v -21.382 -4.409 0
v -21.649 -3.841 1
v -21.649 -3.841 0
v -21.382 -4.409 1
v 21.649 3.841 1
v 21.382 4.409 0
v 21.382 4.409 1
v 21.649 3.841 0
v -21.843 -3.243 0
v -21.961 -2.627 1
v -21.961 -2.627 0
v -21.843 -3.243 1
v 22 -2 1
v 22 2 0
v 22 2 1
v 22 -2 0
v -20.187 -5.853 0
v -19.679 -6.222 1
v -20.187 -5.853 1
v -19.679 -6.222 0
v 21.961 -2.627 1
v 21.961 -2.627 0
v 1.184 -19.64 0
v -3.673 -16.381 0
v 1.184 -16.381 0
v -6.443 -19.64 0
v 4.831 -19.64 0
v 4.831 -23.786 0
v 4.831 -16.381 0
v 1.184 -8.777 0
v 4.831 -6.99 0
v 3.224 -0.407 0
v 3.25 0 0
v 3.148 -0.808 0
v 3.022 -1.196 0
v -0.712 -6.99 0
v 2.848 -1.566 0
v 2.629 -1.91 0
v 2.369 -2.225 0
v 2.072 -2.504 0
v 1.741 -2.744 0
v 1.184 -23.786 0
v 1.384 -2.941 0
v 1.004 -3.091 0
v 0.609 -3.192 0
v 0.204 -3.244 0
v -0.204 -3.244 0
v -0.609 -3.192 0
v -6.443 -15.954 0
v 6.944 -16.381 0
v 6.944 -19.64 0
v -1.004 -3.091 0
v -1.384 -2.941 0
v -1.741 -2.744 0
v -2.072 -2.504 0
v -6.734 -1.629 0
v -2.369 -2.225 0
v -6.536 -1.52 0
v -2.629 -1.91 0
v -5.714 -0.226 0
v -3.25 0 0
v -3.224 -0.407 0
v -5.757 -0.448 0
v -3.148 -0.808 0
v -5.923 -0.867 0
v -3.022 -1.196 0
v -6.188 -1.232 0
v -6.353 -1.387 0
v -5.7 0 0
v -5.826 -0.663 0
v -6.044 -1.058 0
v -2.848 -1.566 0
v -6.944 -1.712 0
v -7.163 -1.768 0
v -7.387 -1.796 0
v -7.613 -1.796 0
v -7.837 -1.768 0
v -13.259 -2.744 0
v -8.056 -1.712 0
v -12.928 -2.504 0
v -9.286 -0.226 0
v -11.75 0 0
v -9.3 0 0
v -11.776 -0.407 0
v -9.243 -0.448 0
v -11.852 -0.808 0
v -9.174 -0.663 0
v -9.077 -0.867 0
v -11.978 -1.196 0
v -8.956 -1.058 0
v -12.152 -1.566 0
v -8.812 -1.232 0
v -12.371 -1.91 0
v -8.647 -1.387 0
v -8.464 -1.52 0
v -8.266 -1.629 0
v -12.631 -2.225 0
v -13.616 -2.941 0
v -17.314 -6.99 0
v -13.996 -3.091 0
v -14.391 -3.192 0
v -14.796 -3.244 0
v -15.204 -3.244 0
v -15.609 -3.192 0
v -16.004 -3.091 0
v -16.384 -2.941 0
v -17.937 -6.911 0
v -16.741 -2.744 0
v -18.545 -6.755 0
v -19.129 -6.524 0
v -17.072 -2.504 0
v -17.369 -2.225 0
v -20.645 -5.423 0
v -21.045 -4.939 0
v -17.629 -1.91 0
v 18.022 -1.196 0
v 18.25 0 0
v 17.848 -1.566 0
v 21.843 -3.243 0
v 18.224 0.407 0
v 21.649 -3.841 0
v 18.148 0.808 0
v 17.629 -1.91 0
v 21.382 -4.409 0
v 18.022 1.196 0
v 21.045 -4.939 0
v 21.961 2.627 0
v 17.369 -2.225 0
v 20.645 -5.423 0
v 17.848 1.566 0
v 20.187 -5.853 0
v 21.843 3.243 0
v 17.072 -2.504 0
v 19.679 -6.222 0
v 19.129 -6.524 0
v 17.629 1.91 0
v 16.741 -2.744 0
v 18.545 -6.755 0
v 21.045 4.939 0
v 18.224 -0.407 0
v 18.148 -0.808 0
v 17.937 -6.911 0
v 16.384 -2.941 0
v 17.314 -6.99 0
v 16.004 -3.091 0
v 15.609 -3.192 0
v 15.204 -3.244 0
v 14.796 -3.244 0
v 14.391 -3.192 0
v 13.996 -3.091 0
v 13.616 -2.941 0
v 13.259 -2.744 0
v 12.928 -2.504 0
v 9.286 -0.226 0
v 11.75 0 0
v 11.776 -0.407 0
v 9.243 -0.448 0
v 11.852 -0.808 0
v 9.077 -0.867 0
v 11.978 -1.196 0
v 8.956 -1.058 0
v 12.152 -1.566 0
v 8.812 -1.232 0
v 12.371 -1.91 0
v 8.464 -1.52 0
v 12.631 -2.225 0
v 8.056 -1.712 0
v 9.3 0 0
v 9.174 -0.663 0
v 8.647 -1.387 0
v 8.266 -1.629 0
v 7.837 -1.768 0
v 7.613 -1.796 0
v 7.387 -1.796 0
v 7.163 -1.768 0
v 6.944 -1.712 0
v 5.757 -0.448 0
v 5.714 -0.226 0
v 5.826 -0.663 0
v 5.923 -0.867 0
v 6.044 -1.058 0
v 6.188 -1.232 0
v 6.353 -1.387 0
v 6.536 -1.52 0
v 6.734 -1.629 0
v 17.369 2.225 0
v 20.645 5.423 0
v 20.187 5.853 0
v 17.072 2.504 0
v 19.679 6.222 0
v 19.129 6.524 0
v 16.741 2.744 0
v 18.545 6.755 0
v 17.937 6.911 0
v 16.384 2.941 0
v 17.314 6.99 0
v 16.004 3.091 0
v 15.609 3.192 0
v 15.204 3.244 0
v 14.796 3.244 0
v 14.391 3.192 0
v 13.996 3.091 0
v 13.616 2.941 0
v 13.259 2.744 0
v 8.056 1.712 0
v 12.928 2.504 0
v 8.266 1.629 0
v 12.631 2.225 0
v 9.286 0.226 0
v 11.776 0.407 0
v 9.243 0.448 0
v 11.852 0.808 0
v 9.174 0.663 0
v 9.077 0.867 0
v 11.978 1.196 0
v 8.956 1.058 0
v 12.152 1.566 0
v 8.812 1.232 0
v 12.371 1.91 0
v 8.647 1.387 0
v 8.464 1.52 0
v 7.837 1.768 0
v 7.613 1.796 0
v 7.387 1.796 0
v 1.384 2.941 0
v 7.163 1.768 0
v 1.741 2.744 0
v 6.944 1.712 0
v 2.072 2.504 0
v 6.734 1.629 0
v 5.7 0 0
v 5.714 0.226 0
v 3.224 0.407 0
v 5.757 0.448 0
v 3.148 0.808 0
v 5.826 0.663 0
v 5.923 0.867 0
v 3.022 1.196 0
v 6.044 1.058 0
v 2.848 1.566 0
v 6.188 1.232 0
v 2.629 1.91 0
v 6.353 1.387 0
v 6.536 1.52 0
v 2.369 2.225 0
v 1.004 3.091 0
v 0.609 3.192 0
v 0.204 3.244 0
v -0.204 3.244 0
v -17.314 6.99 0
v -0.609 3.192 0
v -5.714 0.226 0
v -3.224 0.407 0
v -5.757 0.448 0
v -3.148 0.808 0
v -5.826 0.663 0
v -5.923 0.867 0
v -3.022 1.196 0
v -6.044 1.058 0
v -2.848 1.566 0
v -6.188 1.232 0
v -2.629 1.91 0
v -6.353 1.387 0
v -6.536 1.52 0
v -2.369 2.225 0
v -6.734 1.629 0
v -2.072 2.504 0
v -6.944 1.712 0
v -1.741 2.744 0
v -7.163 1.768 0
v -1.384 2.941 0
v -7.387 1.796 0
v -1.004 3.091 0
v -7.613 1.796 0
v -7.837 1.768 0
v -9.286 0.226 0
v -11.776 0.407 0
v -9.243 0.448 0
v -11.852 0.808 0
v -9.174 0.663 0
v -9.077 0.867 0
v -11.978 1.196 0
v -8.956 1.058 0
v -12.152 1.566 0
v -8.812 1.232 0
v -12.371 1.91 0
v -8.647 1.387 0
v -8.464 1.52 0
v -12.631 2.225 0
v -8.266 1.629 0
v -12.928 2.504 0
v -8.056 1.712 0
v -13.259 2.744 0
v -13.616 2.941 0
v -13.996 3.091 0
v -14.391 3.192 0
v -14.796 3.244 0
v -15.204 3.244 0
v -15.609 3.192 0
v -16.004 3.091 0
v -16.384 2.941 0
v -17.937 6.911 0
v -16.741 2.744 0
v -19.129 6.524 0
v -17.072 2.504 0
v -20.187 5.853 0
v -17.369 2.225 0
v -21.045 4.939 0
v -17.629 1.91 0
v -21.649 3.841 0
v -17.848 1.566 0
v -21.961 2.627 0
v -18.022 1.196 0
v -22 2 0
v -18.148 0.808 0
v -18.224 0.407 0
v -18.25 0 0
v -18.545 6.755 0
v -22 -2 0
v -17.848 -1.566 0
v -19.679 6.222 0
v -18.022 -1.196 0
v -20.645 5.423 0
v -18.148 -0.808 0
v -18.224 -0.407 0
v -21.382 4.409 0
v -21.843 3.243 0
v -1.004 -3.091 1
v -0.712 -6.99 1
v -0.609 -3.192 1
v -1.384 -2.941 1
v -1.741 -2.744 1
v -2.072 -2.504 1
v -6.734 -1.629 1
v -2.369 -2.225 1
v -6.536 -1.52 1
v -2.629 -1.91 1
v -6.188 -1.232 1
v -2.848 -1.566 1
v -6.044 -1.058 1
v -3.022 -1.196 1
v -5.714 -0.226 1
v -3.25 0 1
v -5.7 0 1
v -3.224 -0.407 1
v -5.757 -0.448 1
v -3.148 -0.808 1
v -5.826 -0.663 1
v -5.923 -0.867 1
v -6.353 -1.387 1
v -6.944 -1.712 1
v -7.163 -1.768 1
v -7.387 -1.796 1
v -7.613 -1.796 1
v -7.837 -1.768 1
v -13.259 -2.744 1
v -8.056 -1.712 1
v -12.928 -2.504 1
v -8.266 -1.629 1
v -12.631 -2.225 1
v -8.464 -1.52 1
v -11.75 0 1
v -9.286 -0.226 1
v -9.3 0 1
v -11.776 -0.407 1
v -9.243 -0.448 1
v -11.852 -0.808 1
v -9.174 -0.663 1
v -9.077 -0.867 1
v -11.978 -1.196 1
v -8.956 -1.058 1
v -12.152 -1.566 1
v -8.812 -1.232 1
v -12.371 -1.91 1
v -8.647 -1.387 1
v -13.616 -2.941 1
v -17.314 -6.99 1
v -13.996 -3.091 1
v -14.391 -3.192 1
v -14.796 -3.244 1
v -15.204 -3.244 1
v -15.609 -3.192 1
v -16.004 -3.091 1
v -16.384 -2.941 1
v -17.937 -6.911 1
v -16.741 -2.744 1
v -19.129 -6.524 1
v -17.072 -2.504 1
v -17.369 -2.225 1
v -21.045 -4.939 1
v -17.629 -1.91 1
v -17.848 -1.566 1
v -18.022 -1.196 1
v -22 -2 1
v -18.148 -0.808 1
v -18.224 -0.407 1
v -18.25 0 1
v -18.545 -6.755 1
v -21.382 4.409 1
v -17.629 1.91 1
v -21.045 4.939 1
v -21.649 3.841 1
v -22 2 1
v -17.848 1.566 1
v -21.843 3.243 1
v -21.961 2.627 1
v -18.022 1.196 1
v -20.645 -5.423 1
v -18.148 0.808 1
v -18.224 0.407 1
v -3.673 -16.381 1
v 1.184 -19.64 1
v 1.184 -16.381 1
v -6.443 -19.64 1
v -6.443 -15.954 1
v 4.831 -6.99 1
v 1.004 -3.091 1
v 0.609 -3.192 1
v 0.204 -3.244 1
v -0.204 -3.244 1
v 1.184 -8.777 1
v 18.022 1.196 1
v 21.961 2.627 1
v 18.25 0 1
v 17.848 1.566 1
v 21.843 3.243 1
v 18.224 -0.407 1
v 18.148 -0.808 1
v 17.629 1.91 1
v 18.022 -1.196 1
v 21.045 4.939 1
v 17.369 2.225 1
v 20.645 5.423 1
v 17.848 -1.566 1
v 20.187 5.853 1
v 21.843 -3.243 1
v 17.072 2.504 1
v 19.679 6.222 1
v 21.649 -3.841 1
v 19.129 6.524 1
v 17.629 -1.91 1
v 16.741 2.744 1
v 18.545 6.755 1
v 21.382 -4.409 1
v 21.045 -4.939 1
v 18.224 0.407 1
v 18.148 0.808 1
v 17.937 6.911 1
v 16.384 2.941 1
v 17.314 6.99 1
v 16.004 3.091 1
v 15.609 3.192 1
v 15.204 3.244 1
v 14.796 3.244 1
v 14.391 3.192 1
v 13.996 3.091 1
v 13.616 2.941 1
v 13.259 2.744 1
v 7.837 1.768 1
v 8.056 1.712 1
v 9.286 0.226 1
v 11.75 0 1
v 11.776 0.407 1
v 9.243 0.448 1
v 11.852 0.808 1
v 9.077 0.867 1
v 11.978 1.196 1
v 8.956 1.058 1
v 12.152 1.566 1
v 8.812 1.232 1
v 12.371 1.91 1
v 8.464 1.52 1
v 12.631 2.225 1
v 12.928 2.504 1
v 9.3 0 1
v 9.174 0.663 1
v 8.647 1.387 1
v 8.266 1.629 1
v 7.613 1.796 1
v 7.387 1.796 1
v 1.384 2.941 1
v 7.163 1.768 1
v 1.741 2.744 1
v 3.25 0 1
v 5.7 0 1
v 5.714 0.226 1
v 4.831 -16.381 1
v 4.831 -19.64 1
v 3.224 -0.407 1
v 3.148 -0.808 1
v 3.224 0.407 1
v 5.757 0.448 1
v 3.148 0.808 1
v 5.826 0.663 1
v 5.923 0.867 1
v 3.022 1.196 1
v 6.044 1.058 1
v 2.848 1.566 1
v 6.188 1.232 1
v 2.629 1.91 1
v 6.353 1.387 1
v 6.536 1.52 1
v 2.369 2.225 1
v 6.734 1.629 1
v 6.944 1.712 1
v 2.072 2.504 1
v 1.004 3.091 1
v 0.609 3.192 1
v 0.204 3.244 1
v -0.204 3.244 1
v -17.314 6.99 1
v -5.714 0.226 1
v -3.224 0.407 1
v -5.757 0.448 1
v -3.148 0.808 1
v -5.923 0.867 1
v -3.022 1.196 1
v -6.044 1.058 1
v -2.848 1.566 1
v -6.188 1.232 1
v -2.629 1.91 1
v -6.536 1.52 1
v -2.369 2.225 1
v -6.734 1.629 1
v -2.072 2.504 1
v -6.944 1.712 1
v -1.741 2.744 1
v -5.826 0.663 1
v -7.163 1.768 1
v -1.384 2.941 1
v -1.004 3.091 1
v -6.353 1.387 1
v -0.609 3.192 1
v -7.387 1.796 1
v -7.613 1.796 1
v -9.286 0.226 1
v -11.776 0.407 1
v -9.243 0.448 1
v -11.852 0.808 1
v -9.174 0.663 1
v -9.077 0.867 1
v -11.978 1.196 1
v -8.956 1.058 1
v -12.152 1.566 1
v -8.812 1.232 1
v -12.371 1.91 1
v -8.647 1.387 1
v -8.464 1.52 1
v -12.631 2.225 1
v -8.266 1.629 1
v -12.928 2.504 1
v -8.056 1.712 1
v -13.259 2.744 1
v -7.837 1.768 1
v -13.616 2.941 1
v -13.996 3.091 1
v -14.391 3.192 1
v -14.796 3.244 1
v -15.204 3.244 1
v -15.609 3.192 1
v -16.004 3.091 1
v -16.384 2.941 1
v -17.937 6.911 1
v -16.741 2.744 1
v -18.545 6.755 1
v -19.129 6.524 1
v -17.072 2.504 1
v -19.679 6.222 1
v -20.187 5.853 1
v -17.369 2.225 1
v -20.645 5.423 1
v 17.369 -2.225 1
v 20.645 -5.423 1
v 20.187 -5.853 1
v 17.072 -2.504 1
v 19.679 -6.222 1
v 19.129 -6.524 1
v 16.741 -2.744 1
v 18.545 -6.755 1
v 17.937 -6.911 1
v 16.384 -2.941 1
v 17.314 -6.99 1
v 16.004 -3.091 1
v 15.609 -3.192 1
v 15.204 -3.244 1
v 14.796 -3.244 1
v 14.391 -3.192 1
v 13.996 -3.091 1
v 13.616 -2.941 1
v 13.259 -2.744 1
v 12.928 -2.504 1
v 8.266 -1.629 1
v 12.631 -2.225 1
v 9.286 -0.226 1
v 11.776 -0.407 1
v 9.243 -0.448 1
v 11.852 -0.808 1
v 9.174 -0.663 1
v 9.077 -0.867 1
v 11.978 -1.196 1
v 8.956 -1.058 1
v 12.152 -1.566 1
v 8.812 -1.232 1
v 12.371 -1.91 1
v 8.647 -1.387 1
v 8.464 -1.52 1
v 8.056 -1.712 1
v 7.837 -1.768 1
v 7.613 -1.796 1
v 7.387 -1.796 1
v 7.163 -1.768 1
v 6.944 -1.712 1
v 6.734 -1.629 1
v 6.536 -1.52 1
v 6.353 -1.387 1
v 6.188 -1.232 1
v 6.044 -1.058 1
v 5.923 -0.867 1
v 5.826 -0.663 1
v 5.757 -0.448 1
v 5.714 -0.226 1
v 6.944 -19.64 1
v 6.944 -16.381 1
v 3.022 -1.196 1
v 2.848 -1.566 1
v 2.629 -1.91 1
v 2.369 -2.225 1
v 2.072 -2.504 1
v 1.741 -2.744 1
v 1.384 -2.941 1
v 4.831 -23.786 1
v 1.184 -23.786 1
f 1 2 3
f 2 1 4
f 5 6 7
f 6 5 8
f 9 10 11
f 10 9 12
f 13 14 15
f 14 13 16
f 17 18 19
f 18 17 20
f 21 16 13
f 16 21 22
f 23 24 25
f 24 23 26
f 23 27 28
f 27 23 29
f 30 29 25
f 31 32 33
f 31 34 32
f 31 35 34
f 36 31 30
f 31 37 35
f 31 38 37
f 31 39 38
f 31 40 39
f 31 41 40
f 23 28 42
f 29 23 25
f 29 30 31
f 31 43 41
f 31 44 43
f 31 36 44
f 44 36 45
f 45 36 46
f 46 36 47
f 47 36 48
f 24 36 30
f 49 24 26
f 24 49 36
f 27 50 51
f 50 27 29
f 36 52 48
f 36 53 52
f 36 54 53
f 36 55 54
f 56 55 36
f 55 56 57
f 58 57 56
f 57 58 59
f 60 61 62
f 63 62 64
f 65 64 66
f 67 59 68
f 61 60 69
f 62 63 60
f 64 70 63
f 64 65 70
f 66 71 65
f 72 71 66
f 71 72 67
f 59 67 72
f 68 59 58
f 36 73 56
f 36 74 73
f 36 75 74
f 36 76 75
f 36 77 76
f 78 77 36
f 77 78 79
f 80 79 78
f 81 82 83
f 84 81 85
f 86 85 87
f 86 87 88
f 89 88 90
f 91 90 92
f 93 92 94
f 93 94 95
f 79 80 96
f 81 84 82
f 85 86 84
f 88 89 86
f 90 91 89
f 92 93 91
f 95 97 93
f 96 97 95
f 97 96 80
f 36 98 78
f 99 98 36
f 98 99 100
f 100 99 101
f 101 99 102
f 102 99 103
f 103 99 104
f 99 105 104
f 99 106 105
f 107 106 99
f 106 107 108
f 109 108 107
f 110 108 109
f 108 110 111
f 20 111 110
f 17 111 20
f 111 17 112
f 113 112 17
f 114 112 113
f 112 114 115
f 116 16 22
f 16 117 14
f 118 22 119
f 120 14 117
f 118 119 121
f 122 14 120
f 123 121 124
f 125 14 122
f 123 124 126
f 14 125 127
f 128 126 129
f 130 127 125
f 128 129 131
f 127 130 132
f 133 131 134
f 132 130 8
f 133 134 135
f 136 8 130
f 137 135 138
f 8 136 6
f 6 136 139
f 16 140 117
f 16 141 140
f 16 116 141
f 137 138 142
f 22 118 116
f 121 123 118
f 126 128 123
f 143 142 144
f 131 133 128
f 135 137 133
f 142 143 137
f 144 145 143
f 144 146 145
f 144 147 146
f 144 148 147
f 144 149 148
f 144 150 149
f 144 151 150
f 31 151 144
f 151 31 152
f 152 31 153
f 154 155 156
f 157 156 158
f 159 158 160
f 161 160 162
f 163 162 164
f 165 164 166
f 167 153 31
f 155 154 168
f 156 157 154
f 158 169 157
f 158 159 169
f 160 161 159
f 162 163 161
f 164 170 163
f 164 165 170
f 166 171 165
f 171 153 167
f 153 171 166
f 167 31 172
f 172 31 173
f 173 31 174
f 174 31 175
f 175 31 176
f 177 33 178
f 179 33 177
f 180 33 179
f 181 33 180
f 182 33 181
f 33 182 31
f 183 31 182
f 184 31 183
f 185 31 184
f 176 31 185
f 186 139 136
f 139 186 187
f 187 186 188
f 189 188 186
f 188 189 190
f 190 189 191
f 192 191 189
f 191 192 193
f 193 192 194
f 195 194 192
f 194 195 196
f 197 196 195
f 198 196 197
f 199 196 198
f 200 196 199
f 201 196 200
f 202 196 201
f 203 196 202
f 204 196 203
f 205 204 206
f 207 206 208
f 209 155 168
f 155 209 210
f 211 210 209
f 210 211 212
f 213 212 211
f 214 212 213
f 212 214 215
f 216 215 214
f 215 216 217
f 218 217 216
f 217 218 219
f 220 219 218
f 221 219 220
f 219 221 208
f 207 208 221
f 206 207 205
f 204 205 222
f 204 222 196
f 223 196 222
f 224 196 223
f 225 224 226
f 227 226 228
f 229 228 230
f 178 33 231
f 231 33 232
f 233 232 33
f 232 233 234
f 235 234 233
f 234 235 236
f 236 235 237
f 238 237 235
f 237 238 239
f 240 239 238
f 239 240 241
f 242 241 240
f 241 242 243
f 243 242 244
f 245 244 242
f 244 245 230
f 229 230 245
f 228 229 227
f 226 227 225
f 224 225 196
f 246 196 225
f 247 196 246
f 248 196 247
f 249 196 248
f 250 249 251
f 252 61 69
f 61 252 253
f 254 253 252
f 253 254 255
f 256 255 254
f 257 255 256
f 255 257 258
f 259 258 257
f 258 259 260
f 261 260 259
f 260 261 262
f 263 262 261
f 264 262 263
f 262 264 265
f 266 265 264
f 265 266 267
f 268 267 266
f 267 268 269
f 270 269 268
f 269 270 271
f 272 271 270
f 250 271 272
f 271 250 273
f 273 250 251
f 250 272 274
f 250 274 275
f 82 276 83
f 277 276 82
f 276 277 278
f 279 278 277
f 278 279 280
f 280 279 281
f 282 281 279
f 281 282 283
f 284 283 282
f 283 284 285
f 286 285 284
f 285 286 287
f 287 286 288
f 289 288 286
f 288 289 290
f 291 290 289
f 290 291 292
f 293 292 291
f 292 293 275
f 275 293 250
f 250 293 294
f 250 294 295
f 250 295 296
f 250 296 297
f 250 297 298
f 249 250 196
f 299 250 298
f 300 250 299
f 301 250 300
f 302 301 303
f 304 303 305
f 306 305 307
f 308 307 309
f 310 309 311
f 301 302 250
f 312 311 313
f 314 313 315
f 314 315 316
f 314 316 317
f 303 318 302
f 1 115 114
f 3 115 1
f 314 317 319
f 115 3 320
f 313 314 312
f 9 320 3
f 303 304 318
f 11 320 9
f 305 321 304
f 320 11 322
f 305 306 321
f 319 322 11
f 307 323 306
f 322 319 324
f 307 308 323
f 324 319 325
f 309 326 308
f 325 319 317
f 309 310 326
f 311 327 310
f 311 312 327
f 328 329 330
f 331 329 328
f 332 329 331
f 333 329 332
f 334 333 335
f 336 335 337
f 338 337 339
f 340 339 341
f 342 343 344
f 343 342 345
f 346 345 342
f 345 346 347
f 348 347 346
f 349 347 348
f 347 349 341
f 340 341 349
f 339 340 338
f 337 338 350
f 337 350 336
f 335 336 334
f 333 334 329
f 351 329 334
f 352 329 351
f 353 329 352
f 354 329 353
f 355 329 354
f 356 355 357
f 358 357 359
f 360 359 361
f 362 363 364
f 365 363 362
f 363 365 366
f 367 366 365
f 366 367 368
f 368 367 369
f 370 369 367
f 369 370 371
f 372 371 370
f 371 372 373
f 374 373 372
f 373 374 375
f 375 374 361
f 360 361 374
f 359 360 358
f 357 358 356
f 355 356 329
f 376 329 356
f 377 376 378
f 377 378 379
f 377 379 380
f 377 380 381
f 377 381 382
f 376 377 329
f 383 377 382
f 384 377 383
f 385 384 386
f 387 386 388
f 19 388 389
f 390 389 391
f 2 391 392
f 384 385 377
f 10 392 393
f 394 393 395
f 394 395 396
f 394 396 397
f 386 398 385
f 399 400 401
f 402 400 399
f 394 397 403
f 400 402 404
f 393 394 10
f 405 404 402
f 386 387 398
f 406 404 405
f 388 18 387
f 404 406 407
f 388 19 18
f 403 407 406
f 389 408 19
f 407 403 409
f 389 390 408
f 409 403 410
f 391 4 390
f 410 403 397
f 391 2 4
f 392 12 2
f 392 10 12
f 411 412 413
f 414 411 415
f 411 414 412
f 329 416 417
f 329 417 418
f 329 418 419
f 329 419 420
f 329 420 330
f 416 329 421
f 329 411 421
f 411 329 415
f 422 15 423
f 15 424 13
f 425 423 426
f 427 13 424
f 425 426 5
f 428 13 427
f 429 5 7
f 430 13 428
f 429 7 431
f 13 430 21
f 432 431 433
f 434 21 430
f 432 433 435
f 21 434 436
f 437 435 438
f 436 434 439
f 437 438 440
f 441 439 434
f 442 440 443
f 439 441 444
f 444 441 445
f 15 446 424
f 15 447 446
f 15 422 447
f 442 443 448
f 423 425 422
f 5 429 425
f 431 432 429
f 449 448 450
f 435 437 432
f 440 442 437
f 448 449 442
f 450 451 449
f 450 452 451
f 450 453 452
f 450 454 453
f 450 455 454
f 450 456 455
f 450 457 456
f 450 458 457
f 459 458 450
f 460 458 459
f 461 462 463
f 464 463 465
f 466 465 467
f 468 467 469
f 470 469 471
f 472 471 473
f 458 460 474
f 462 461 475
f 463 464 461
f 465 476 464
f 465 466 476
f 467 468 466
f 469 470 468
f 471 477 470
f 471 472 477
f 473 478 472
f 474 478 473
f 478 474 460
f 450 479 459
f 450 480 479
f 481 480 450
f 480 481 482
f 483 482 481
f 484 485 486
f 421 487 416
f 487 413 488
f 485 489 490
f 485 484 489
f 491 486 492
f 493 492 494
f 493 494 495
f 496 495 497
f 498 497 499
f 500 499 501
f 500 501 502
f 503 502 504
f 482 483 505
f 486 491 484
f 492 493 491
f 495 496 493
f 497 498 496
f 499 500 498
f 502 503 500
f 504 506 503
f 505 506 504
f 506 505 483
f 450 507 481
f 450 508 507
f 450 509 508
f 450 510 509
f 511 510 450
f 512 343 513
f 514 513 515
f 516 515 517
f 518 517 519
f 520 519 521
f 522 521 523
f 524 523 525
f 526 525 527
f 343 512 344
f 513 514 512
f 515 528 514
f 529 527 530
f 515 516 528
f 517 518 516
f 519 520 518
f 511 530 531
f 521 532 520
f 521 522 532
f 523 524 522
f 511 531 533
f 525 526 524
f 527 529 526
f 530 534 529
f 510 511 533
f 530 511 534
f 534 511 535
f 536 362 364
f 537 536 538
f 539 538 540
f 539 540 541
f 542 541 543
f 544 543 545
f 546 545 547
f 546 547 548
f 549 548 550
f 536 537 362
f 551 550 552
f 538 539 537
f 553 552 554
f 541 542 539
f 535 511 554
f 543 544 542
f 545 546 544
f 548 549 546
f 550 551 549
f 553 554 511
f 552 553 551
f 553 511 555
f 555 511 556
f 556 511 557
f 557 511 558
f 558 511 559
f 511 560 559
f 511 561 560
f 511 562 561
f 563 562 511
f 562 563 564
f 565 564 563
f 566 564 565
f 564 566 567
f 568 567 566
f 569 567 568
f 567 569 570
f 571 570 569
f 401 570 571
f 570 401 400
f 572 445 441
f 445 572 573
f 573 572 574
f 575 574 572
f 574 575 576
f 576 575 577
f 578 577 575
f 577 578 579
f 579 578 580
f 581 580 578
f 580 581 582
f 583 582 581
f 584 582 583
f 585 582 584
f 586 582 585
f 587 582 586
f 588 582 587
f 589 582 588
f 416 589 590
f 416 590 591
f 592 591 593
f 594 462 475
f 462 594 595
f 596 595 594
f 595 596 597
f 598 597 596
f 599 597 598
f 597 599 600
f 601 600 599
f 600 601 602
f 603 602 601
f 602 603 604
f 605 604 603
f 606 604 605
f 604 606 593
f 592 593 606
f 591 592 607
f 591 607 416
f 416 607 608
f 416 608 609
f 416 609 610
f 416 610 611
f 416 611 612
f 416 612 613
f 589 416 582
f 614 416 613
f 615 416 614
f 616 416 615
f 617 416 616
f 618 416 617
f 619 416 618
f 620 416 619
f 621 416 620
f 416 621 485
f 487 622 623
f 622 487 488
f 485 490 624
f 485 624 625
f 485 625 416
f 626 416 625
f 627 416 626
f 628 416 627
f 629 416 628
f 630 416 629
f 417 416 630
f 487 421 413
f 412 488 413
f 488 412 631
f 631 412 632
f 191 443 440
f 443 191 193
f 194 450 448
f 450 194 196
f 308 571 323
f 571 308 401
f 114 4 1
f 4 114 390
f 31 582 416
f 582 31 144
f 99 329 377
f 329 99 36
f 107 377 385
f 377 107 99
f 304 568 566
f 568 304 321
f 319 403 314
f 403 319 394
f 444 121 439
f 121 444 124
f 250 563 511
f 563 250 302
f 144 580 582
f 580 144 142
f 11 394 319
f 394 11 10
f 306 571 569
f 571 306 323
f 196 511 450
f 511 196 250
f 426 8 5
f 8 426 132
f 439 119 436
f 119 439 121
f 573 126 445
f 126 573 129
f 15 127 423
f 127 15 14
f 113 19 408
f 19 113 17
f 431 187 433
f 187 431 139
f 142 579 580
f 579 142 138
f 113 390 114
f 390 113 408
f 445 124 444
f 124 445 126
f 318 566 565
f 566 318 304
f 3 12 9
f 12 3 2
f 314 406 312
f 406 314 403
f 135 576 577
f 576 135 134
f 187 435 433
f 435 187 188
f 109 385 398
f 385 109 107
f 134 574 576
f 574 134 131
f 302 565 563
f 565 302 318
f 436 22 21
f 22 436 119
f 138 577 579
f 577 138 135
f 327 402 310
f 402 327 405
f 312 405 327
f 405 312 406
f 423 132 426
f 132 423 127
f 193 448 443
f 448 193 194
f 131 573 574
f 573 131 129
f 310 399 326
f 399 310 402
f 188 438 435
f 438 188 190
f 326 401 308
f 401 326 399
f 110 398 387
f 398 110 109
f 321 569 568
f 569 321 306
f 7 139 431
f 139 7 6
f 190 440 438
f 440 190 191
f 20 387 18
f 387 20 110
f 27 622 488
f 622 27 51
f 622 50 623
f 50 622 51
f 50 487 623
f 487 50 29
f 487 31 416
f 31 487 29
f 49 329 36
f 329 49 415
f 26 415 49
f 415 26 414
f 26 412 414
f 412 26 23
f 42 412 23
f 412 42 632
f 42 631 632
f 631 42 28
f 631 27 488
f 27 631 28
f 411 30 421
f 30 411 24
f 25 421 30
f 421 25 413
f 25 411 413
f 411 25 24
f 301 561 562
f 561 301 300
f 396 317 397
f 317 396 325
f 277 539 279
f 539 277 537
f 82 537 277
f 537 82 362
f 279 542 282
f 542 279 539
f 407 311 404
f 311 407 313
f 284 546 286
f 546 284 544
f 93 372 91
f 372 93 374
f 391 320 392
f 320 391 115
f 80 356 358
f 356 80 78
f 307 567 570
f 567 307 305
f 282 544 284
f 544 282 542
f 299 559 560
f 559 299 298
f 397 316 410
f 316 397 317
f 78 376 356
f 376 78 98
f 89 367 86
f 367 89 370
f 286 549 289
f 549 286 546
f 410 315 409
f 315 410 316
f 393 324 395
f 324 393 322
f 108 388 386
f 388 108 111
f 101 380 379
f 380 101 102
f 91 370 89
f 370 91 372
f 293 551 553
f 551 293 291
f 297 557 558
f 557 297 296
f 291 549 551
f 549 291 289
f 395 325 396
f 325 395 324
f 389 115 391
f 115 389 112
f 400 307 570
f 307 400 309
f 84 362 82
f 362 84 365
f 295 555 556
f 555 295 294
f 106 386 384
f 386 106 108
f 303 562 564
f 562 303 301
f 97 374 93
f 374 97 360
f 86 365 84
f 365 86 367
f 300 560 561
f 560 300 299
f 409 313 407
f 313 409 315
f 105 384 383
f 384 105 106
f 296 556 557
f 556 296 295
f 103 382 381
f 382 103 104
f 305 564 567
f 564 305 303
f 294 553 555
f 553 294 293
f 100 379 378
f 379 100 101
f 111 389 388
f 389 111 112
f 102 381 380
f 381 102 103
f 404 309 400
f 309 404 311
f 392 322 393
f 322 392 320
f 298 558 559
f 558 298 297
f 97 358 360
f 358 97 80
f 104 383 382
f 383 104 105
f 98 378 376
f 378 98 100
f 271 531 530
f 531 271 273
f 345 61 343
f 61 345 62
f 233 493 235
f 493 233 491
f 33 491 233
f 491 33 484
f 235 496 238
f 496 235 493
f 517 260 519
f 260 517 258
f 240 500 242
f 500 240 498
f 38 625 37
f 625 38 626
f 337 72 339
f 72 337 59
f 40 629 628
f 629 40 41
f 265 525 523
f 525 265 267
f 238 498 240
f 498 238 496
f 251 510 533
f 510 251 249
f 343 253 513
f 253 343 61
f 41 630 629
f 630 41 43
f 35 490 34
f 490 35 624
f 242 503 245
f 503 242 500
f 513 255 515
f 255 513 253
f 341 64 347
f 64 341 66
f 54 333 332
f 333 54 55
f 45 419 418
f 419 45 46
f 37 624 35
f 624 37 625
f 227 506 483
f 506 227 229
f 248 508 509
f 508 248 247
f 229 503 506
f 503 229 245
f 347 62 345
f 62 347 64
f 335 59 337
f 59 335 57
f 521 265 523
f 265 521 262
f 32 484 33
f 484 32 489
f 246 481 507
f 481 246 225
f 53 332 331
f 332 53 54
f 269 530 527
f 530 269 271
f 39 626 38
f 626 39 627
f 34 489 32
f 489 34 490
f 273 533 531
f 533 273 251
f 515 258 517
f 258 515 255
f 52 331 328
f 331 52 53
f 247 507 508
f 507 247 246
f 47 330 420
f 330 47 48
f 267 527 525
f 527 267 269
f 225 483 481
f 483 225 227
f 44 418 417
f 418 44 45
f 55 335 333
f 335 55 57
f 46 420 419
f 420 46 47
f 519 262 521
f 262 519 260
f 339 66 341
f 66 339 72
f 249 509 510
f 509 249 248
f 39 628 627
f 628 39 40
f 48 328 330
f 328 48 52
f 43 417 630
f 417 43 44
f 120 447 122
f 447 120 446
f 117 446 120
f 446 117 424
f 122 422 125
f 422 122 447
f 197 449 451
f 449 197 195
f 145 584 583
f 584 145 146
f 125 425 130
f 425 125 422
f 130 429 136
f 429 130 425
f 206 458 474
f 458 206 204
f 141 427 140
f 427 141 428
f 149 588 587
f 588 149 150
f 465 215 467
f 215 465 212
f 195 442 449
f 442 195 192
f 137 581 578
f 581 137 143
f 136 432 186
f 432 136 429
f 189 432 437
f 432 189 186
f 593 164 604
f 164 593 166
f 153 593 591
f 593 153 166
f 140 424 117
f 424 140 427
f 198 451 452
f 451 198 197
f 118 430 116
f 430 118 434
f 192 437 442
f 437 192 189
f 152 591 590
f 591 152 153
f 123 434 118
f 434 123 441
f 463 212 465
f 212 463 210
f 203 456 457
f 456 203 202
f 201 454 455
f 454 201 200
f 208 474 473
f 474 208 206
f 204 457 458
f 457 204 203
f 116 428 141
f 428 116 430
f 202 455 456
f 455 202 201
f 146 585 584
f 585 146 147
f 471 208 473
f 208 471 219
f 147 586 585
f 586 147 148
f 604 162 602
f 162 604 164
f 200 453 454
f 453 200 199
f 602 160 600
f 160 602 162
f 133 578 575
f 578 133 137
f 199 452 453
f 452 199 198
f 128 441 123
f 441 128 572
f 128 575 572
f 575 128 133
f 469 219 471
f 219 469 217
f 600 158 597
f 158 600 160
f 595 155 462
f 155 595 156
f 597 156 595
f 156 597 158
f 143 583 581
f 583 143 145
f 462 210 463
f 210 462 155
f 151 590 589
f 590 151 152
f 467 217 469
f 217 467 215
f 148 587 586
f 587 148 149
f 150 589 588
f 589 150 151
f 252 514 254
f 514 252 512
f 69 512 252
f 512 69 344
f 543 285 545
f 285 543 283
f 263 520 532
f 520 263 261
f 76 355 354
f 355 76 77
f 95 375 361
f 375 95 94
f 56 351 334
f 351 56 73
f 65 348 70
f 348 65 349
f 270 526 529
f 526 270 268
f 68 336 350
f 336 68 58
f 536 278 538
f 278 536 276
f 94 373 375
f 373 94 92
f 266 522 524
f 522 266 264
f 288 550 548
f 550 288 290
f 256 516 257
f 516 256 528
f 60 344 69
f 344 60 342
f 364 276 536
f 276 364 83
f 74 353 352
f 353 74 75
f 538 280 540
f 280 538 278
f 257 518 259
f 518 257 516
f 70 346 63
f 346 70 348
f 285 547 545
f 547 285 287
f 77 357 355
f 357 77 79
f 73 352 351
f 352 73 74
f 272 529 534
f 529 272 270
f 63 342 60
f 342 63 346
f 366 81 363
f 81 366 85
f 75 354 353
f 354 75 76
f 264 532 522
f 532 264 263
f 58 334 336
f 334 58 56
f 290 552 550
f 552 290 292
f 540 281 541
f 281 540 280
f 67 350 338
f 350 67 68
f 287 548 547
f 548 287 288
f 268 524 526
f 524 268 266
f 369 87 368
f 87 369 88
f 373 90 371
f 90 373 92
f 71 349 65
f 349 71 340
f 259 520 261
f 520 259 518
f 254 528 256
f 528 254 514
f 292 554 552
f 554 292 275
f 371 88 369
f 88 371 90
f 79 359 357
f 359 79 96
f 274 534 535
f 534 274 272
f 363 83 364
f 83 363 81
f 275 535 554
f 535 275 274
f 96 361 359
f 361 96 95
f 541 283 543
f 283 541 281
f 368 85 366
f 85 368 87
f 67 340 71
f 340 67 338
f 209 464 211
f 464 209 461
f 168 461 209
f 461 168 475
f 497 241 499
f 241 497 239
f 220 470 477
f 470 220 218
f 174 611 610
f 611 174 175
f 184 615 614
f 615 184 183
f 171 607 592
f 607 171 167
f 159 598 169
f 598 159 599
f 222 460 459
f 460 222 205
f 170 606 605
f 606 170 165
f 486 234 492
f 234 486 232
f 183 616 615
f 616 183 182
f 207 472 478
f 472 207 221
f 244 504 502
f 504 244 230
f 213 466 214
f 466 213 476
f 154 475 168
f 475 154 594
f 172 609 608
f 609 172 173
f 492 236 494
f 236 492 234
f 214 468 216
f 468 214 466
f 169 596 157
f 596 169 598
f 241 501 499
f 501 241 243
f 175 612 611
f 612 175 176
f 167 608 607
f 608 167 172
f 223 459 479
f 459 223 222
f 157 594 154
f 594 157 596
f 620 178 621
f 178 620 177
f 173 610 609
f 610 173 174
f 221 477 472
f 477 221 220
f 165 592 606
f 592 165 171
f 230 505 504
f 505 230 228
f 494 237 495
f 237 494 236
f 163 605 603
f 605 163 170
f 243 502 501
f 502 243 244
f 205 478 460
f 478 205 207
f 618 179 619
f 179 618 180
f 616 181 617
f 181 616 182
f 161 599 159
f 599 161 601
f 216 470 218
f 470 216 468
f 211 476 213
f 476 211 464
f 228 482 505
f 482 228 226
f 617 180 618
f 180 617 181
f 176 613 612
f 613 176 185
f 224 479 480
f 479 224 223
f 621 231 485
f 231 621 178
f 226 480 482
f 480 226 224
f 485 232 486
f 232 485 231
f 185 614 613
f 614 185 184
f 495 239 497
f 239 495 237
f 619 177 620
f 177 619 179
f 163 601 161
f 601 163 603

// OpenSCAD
$fn = 50;


difference() {
	union() {
		hull() {
			translate(v = [-17.0000000000, 2.0000000000, 0]) {
				cylinder(h = 1, r = 5);
			}
			translate(v = [17.0000000000, 2.0000000000, 0]) {
				cylinder(h = 1, r = 5);
			}
			translate(v = [-17.0000000000, -2.0000000000, 0]) {
				cylinder(h = 1, r = 5);
			}
			translate(v = [17.0000000000, -2.0000000000, 0]) {
				cylinder(h = 1, r = 5);
			}
		}
		translate(v = [0, -5, 0]) {
			linear_extrude(height = 1) {
				text(font = "DejaVu Sans Mono:style=Bold", halign = "center", size = 19.0000000000, text = "4", valign = "top");
			}
		}
	}
	union() {
		translate(v = [-15.0000000000, 0.0000000000, 0]) {
			translate(v = [0, 0, -100]) {
				cylinder(h = 200, r = 3.2500000000);
			}
		}
		translate(v = [0, 0, -100]) {
			cylinder(h = 200, r = 3.2500000000);
		}
		translate(v = [15.0000000000, 0.0000000000, 0]) {
			translate(v = [0, 0, -100]) {
				cylinder(h = 200, r = 3.2500000000);
			}
		}
		translate(v = [-15.0000000000, 0.0000000000, 0]) {
			translate(v = [0, 0, -100]) {
				cylinder(h = 200, r = 1.8000000000);
			}
		}
		translate(v = [-7.5000000000, 0.0000000000, 0]) {
			translate(v = [0, 0, -100]) {
				cylinder(h = 200, r = 1.8000000000);
			}
		}
		translate(v = [0, 0, -100]) {
			cylinder(h = 200, r = 1.8000000000);
		}
		translate(v = [7.5000000000, 0.0000000000, 0]) {
			translate(v = [0, 0, -100]) {
				cylinder(h = 200, r = 1.8000000000);
			}
		}
		translate(v = [15.0000000000, 0.0000000000, 0]) {
			translate(v = [0, 0, -100]) {
				cylinder(h = 200, r = 1.8000000000);
			}
		}
	}
}
